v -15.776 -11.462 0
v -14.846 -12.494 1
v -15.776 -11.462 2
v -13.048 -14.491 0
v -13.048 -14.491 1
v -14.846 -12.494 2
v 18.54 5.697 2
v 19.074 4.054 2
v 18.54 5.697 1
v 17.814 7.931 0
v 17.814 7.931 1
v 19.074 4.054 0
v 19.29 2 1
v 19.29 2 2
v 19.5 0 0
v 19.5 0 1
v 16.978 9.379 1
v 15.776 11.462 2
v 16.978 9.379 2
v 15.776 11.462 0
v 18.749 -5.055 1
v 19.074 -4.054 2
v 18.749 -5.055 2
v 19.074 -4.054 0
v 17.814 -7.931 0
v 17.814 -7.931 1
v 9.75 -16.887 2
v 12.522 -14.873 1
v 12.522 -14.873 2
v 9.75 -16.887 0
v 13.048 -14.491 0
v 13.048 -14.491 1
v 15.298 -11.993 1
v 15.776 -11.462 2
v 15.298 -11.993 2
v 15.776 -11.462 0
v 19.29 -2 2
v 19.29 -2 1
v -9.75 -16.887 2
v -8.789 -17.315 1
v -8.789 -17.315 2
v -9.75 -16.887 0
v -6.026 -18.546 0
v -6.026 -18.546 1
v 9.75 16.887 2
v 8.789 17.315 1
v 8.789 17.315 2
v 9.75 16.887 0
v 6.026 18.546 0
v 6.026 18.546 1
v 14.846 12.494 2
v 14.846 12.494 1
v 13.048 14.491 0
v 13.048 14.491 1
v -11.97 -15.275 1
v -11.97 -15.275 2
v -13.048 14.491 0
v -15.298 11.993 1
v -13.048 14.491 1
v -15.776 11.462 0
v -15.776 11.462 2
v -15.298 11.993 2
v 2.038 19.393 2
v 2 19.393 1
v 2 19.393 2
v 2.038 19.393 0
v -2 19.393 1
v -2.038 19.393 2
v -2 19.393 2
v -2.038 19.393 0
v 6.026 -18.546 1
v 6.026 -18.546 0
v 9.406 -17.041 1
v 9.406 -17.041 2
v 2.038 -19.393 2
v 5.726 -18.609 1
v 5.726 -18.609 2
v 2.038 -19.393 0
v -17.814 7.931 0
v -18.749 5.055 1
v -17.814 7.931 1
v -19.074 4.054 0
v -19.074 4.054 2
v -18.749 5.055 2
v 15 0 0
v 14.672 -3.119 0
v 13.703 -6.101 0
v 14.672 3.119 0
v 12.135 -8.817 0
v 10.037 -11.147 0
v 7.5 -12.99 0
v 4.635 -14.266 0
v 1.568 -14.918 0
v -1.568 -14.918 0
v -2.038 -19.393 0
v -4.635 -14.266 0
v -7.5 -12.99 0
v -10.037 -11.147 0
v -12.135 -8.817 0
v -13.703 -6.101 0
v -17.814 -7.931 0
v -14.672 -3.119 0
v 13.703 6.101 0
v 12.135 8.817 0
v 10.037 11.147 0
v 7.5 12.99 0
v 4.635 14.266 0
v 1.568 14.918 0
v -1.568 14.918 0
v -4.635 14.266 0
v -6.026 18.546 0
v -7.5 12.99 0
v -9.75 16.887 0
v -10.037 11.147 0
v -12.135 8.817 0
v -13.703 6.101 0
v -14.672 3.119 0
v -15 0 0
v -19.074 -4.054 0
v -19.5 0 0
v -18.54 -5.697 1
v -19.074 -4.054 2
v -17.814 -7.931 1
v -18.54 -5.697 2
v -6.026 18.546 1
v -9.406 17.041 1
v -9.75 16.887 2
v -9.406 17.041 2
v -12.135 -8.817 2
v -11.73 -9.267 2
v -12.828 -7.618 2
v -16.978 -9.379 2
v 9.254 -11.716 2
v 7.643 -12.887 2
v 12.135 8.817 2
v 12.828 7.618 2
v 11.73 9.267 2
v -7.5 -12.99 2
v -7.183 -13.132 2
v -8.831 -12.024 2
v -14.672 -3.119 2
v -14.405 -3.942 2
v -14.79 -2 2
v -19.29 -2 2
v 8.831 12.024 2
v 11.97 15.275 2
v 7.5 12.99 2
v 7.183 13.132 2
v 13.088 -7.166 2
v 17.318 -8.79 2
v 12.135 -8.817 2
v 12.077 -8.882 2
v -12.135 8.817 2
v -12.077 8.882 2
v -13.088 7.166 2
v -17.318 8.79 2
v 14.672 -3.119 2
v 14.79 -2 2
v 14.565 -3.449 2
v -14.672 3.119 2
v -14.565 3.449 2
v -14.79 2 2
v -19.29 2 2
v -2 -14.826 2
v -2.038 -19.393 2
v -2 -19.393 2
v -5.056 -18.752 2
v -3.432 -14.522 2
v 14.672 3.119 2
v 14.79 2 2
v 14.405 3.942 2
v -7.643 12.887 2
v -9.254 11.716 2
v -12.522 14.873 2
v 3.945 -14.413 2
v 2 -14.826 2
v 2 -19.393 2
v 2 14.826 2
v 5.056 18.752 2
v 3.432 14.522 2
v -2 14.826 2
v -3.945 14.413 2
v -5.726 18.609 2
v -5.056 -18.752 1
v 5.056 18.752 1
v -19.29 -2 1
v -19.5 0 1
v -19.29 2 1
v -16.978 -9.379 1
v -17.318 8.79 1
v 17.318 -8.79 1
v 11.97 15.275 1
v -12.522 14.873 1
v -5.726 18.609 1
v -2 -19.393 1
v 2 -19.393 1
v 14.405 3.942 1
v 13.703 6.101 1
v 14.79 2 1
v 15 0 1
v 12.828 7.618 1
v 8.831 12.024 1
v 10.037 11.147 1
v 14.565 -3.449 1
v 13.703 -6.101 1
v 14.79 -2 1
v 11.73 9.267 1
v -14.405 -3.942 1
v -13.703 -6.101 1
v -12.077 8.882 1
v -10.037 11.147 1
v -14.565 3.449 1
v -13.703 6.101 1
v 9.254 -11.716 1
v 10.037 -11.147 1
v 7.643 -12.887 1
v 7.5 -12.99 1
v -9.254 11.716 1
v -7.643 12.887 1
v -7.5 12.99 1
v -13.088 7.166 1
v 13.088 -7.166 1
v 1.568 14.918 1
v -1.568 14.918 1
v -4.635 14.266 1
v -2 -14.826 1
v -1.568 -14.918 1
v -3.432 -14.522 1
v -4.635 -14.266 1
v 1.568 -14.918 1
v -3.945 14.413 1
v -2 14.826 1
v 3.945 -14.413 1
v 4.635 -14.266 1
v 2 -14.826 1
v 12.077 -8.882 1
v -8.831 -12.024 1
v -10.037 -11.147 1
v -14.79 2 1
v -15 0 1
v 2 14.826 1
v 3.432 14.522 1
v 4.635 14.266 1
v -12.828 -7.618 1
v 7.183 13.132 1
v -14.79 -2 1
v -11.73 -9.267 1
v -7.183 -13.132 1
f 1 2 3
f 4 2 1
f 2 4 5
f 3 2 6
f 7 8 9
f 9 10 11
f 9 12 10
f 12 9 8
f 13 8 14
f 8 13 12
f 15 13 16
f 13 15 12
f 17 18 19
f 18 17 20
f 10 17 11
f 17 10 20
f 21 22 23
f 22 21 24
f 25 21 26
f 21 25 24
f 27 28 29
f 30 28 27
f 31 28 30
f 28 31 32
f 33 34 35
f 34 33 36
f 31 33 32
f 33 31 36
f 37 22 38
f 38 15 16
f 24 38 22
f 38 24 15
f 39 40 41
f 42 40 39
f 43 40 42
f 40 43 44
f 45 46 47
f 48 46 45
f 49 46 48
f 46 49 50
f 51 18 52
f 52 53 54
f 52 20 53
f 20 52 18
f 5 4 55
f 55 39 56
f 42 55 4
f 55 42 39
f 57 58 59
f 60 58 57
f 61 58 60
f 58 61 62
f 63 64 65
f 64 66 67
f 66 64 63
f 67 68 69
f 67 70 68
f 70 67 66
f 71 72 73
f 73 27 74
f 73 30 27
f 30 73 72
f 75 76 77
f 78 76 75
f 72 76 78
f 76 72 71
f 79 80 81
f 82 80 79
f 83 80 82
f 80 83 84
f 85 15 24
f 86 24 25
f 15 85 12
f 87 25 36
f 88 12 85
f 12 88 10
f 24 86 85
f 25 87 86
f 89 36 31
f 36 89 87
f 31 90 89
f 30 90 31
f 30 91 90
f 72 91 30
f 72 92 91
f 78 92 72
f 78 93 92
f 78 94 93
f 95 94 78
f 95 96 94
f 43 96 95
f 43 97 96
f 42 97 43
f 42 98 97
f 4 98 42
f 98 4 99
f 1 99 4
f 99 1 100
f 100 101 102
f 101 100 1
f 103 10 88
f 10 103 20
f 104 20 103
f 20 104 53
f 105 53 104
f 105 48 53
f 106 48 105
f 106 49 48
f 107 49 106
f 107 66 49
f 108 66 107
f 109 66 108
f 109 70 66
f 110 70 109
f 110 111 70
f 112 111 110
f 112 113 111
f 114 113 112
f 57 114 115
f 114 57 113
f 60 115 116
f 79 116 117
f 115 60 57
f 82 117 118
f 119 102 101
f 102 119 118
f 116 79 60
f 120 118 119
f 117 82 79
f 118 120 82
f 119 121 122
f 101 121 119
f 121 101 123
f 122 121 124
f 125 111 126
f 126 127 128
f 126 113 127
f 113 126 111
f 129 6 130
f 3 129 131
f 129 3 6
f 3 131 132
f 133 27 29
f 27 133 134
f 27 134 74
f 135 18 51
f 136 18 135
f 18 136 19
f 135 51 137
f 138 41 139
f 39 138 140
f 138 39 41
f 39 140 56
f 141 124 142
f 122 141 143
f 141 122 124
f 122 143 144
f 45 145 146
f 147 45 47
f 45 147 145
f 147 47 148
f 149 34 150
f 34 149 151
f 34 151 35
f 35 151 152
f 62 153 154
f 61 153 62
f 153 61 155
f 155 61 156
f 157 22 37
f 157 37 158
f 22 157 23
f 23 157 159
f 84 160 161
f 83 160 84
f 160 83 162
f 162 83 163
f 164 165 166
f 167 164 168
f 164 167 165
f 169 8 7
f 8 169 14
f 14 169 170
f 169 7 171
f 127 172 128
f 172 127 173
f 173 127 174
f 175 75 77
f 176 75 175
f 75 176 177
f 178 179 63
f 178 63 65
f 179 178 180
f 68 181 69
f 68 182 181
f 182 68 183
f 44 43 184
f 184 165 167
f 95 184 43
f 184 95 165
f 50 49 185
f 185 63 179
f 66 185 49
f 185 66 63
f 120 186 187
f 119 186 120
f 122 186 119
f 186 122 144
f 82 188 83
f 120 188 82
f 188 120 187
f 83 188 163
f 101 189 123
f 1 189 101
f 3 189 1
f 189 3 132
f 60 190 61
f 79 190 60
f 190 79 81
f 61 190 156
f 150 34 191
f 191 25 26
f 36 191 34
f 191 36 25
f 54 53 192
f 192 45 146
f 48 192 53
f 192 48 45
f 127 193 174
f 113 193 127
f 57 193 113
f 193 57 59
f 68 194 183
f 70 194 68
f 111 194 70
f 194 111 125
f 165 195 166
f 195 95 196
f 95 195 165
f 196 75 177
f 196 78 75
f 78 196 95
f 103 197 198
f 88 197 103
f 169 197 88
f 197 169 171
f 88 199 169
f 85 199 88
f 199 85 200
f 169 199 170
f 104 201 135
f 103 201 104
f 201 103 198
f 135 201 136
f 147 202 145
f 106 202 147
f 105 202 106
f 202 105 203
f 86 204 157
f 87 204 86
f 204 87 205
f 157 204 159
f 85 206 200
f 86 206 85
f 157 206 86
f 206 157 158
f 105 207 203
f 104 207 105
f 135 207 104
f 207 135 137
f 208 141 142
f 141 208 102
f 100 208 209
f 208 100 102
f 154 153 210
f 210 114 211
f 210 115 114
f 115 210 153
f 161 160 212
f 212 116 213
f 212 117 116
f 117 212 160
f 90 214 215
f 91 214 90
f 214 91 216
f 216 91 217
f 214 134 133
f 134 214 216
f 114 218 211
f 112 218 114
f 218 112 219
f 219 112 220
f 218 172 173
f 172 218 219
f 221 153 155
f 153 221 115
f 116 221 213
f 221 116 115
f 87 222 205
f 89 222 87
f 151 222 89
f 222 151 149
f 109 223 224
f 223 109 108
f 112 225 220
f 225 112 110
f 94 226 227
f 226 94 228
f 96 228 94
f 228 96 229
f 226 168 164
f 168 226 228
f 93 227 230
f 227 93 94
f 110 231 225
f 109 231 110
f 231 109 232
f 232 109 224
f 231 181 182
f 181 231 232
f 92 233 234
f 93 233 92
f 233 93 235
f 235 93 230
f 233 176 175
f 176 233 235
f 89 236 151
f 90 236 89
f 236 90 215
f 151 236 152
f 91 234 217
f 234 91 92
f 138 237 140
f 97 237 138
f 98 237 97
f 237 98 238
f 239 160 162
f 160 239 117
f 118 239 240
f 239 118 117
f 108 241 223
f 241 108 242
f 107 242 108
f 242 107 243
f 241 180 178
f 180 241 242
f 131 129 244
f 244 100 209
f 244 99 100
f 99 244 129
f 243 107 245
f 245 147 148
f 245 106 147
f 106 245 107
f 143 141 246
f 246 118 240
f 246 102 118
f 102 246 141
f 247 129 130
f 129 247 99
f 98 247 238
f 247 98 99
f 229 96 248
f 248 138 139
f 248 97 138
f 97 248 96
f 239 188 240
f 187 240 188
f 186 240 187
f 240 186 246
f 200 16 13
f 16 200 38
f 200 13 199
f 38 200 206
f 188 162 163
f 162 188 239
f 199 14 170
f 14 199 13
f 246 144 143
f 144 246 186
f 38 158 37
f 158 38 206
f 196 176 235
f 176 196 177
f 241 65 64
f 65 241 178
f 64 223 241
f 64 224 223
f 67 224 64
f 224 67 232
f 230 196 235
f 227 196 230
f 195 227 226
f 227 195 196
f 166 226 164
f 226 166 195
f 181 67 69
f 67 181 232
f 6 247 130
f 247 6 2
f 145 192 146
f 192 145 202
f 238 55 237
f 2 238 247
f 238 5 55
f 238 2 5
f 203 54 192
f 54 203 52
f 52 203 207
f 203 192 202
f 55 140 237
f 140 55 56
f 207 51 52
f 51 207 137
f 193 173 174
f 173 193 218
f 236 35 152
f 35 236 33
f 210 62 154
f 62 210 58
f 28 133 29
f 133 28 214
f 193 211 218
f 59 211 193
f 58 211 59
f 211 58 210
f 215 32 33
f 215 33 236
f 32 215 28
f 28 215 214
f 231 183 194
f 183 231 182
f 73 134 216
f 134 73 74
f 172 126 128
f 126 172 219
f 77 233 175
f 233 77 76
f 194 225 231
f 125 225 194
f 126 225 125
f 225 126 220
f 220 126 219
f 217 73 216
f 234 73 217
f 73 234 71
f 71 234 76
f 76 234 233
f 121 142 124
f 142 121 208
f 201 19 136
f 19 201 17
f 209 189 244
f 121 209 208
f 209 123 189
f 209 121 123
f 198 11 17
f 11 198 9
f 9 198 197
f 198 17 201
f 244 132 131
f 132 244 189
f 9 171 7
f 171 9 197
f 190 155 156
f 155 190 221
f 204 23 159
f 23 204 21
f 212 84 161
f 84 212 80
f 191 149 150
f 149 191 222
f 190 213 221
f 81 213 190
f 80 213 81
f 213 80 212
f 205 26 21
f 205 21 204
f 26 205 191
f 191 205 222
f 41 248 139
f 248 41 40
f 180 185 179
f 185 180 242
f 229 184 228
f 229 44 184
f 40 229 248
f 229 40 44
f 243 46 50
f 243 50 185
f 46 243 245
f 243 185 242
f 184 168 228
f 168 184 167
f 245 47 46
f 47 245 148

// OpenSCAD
difference()
{
  cylinder(d=39,h=2);
  translate([0,0,-1]) cylinder(d=30,h=4);
  translate([-20,-2,1]) cube([45,4,5]);
  translate([-2,-20,1]) cube([4,45,5]);
  rotate([0,0,46]) translate([-20,-2,1]) cube([45,4,5]);
  rotate([0,0,46]) translate([-2,-20,1]) cube([4,45,5]);
  rotate([0,0,23]) translate([-2,-20,1]) cube([4,45,5]);
  rotate([0,0,23]) translate([-20,-2,1]) cube([45,4,5]);
  rotate([0,0,69]) translate([-2,-20,1]) cube([4,45,5]);
  rotate([0,0,69]) translate([-20,-2,1]) cube([45,4,5]);
}
